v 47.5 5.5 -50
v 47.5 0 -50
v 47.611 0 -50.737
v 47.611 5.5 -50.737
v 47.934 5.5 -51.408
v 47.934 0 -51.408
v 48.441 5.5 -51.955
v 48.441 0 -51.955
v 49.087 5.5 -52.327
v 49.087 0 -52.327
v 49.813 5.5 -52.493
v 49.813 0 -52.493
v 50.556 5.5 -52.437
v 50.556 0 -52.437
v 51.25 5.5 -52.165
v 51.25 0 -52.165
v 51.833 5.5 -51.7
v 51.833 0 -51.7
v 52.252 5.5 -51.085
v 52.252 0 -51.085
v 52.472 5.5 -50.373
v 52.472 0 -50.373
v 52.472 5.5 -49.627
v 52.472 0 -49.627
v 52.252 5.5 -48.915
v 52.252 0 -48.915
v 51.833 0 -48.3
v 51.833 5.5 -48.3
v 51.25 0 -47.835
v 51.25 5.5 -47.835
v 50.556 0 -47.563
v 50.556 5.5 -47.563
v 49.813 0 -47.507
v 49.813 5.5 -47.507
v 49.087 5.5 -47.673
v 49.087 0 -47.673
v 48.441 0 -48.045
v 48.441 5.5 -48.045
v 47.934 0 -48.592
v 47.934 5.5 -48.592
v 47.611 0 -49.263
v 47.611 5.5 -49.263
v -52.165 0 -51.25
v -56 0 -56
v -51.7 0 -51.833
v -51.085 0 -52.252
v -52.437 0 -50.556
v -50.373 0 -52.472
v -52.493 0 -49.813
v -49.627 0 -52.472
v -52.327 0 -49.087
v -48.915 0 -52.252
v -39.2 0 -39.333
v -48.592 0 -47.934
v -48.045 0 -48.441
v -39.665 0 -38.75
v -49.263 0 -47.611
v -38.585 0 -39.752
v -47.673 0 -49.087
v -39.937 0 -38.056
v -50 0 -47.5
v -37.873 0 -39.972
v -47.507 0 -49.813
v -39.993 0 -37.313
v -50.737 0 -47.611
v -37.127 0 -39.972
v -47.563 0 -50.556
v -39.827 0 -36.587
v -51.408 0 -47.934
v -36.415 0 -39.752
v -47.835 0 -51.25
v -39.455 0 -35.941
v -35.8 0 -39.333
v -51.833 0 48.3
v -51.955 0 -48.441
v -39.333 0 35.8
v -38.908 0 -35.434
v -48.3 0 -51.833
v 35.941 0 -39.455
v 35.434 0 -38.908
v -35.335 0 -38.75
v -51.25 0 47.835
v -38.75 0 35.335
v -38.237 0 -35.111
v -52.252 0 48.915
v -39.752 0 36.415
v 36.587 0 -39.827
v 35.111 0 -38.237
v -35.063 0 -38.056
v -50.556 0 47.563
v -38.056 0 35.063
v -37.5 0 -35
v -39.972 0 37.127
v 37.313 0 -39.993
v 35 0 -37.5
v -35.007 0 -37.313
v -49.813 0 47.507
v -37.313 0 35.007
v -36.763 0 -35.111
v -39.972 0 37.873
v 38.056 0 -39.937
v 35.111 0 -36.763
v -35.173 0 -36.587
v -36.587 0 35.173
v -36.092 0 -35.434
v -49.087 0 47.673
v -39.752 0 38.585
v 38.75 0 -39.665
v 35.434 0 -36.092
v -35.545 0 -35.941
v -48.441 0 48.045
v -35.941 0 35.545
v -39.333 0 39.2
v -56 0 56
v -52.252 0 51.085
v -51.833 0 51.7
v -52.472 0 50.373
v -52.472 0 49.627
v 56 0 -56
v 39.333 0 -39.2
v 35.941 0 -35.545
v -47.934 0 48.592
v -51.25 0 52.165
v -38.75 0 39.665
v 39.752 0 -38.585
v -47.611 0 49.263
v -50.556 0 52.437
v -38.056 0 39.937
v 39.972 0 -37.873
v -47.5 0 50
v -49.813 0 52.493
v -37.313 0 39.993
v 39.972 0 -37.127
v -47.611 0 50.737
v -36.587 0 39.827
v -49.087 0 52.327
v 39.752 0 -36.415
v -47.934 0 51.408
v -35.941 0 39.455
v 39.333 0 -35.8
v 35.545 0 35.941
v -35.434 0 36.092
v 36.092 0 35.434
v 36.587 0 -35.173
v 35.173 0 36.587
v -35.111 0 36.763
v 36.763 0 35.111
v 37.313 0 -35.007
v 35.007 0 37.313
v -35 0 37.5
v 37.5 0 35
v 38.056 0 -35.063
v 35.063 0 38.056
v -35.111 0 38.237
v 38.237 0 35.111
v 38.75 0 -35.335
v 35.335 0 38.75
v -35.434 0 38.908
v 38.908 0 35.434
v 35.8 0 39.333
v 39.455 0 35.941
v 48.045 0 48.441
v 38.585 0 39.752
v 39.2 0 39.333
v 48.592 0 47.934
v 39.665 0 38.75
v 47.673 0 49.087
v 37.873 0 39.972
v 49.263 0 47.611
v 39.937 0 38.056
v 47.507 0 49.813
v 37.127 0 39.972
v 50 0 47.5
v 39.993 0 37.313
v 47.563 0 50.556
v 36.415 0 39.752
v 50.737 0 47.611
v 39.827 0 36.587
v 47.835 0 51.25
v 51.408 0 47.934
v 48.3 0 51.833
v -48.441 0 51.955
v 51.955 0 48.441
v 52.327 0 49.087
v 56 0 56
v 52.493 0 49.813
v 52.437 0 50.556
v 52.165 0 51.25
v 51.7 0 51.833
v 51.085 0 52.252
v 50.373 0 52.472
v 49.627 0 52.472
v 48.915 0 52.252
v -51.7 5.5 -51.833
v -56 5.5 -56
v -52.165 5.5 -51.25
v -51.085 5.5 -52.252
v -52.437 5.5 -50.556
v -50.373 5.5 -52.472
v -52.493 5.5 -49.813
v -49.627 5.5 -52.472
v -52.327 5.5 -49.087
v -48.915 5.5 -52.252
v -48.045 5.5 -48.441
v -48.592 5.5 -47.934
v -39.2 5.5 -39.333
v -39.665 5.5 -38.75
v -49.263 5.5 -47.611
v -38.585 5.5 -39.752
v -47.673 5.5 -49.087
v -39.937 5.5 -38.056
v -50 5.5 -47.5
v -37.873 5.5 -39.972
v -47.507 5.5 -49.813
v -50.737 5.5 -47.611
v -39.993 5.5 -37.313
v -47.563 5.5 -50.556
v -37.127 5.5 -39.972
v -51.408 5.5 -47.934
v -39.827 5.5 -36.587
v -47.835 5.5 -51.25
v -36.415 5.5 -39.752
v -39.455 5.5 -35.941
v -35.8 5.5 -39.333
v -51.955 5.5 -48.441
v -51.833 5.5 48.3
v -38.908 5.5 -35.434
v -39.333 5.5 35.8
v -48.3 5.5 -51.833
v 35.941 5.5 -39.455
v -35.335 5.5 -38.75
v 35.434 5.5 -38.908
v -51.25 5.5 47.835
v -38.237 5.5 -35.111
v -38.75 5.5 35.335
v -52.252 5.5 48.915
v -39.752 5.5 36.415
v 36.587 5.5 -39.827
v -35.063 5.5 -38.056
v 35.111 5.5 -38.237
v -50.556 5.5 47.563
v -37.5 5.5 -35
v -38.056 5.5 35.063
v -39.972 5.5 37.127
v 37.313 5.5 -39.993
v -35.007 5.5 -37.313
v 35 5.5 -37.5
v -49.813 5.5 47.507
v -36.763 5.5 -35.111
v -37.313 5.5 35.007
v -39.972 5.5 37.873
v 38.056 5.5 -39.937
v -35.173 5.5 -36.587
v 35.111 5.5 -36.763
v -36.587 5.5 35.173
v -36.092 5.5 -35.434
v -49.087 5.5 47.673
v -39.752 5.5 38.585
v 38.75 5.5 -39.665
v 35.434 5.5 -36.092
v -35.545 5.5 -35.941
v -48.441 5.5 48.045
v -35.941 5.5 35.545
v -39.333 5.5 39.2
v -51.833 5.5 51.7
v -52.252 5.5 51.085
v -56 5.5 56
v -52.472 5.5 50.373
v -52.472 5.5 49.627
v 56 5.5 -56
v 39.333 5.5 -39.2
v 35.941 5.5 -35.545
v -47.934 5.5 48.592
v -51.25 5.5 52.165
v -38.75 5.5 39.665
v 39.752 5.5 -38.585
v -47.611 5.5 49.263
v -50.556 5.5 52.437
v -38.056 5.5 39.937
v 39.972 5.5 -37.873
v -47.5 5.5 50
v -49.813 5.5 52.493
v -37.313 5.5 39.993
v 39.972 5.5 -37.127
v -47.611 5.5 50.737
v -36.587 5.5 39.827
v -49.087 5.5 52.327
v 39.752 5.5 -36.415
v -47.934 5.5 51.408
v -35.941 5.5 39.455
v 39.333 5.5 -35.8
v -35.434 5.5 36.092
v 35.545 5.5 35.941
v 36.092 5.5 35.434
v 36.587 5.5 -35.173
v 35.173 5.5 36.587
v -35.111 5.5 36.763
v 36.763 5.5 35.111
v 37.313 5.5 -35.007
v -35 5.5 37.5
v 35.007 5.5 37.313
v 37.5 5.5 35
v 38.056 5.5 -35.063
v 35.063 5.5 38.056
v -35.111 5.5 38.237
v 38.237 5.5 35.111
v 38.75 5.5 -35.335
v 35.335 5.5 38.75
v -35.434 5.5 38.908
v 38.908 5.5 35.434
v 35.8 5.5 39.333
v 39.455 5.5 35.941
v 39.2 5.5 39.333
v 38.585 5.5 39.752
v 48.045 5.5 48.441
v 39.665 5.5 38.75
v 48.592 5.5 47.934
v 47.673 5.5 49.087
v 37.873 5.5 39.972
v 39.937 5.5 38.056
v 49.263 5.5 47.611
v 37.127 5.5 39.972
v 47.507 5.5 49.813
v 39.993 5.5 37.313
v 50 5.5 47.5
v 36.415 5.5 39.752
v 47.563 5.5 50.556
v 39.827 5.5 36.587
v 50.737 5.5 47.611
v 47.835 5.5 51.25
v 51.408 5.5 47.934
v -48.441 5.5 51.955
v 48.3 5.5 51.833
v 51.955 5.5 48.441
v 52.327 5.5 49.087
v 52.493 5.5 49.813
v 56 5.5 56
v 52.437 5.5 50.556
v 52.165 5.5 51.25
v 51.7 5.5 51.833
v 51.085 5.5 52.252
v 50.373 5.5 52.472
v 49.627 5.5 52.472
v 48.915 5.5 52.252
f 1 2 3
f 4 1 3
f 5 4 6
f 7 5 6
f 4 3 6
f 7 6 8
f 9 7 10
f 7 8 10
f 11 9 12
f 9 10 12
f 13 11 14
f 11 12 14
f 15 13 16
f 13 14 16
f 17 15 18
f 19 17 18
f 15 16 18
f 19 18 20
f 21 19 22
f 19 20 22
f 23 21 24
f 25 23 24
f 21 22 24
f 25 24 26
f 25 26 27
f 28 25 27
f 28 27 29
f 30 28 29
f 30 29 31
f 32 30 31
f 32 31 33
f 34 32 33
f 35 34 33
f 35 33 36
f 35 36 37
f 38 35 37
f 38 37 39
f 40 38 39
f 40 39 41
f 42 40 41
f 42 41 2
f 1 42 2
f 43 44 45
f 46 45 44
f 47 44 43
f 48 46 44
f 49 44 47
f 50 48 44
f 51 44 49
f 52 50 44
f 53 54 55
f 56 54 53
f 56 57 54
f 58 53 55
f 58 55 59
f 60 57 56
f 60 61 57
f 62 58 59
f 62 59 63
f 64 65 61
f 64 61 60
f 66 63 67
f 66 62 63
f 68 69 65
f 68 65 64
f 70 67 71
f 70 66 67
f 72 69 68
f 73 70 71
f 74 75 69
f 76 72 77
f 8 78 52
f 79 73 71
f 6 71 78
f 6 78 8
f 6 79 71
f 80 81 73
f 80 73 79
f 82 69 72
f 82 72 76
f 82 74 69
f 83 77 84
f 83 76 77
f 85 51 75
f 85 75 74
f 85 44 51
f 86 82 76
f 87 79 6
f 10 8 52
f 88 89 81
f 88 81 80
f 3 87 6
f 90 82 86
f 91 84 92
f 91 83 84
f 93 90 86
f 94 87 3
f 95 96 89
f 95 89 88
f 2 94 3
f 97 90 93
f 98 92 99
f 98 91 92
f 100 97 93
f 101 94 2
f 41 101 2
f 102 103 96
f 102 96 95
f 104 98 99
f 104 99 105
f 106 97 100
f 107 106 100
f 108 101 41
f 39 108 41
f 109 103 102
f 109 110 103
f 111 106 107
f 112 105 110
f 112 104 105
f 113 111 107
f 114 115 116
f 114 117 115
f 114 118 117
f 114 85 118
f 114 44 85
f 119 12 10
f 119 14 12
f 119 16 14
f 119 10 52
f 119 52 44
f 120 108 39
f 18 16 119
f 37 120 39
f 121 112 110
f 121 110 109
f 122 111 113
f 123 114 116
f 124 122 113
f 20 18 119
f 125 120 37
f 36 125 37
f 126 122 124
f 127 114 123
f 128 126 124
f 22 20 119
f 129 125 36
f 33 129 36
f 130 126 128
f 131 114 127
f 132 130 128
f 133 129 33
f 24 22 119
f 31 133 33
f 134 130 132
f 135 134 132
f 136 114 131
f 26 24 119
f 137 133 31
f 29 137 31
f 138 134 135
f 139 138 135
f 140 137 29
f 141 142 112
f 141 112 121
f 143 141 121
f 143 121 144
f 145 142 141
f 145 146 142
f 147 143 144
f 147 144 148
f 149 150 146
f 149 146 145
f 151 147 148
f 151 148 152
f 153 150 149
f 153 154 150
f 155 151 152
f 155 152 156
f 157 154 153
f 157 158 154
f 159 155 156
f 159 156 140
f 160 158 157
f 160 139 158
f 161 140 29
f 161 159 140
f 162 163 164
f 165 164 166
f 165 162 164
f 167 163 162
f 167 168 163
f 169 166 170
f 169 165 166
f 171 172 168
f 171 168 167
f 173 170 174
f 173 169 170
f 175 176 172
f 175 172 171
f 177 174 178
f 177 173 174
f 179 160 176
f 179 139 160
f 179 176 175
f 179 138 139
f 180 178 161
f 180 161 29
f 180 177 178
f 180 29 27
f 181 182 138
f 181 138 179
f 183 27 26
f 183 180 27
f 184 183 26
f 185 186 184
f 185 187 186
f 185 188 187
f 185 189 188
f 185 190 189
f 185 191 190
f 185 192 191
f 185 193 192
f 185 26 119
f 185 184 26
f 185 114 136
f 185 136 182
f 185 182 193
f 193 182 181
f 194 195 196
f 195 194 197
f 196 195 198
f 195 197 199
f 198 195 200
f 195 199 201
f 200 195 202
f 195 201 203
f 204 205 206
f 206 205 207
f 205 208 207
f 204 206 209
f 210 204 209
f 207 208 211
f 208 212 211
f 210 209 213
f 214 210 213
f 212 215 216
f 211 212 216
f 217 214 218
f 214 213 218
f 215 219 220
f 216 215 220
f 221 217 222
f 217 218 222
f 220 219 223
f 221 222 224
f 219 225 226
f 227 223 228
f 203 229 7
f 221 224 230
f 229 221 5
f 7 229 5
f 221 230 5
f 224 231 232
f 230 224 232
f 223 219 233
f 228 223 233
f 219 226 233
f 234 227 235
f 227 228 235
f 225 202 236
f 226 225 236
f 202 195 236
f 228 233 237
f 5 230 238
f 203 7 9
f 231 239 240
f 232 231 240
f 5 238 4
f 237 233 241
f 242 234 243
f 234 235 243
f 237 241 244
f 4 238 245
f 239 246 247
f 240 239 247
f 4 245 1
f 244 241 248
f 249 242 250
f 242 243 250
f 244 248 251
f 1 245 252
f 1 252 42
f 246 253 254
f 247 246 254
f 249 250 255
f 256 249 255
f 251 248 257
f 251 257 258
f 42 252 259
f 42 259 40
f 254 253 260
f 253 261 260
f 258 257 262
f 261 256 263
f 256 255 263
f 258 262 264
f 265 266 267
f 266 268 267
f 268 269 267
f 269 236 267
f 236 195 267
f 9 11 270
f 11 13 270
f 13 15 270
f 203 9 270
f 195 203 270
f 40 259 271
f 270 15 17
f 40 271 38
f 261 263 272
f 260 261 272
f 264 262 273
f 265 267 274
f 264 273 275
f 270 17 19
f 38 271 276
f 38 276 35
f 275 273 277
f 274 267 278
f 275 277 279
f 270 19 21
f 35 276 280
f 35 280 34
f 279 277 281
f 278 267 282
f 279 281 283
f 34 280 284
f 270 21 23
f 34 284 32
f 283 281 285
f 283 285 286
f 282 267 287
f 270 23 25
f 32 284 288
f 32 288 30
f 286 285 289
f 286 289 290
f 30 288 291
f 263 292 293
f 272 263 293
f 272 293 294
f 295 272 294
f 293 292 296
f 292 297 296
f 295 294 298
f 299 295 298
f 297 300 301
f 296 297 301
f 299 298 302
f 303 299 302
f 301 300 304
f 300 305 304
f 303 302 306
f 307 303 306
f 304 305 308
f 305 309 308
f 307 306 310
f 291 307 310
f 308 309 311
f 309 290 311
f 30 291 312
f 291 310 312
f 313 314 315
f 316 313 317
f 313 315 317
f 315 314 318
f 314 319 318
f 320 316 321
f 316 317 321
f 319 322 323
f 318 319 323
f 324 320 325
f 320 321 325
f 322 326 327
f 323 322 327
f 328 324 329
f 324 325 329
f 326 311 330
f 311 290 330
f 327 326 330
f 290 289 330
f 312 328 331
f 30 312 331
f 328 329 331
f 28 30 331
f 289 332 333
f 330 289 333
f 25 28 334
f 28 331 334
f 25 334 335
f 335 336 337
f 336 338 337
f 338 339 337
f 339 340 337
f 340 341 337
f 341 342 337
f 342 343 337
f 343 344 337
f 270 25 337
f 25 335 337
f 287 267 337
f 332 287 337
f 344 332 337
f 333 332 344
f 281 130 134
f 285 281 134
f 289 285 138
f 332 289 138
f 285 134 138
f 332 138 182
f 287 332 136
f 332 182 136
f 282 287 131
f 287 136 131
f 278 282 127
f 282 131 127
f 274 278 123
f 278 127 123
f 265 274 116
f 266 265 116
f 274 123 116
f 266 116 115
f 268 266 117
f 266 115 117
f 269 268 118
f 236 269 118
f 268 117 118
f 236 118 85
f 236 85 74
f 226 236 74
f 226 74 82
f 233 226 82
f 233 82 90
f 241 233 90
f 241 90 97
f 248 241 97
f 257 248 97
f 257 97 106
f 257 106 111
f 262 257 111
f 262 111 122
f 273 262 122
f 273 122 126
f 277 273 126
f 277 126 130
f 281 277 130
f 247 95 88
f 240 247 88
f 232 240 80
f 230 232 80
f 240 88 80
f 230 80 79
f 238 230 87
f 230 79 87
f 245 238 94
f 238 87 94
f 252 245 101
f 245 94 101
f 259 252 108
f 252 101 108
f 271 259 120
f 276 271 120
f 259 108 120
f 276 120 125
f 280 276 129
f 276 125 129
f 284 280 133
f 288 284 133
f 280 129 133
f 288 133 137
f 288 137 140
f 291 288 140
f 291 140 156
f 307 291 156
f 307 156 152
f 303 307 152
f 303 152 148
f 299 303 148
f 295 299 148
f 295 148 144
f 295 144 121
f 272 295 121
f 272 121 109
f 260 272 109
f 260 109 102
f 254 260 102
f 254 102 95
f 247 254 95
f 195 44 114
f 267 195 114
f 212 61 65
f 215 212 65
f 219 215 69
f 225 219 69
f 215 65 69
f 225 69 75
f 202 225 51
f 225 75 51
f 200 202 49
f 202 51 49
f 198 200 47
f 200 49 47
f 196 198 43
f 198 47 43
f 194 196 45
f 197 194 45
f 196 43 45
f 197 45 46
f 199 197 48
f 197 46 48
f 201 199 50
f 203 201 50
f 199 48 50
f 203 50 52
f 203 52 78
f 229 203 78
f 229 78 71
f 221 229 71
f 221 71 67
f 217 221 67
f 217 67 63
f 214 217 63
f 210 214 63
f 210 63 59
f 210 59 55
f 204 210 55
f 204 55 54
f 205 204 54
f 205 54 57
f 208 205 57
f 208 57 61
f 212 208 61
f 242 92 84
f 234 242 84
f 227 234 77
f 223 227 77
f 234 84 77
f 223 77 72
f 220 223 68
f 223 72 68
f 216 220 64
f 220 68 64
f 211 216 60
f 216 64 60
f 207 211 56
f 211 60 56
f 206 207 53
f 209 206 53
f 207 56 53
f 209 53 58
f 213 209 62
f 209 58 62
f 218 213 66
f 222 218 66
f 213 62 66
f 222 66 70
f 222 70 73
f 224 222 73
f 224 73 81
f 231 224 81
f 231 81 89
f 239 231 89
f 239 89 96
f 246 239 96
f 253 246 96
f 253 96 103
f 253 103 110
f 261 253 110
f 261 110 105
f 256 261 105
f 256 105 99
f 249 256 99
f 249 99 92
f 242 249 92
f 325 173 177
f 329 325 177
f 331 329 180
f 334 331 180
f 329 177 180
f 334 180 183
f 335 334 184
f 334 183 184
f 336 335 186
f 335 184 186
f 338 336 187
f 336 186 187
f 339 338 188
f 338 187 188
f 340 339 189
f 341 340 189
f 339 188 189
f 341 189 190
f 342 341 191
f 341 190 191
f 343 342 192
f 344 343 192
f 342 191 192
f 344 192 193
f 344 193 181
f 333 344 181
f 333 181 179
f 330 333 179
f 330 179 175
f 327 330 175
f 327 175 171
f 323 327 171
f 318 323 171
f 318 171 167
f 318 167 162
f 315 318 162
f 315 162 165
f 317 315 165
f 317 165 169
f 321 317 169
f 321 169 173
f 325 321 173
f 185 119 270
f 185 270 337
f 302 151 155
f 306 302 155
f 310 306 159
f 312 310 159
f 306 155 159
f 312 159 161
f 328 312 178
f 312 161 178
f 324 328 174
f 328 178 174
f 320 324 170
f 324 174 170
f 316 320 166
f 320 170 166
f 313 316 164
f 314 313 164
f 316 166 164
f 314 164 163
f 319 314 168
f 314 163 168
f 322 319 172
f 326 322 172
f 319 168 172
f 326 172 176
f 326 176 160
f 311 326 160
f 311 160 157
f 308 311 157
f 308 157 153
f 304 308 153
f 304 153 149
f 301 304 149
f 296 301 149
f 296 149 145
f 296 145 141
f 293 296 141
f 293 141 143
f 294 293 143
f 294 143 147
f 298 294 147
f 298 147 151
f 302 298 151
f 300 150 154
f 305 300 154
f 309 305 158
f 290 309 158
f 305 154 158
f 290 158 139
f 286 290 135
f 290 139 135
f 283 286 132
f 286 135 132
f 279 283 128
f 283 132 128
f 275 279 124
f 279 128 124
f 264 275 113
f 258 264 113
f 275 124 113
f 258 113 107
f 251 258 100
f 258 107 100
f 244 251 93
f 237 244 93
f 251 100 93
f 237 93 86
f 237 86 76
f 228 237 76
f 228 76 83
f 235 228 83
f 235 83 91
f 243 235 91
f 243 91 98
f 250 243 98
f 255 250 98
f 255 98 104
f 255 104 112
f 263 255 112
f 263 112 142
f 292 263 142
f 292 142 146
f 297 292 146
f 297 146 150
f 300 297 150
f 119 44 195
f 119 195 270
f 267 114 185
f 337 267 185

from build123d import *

# Parameters (mm, degrees)
SKETCH002_W        = 112
SKETCH002_H        = 112
PAD001_DEPTH       = 5.5
SKETCH003_R        = 2.5
POCKET_DEPTH       = 322.475762
POLARPATTERN_COUNT = 4


with BuildPart() as part:
    # Sketch002 → Pad001 (new body)
    with BuildSketch(Plane.XZ):
        Rectangle(SKETCH002_W, SKETCH002_H)
    extrude(amount=-PAD001_DEPTH)

    # Sketch003 (on Face5 of Pad001) → Pocket (cut, through all)
    with BuildSketch(Plane.XZ):
        with Locations((-50, 50)):
            Circle(SKETCH003_R)
        with Locations((-37.5, 37.5)):
            Circle(SKETCH003_R)
    pocket = extrude(amount=-POCKET_DEPTH, mode=Mode.SUBTRACT)

    # PolarPattern: Pocket ×4 about axis
    polarpattern_axis = Axis((0, 0, 0), (0, -1, 0))
    for i in range(1, POLARPATTERN_COUNT):
        add(pocket.rotate(polarpattern_axis, i * 360 / POLARPATTERN_COUNT), mode=Mode.SUBTRACT)


solid = part.part
